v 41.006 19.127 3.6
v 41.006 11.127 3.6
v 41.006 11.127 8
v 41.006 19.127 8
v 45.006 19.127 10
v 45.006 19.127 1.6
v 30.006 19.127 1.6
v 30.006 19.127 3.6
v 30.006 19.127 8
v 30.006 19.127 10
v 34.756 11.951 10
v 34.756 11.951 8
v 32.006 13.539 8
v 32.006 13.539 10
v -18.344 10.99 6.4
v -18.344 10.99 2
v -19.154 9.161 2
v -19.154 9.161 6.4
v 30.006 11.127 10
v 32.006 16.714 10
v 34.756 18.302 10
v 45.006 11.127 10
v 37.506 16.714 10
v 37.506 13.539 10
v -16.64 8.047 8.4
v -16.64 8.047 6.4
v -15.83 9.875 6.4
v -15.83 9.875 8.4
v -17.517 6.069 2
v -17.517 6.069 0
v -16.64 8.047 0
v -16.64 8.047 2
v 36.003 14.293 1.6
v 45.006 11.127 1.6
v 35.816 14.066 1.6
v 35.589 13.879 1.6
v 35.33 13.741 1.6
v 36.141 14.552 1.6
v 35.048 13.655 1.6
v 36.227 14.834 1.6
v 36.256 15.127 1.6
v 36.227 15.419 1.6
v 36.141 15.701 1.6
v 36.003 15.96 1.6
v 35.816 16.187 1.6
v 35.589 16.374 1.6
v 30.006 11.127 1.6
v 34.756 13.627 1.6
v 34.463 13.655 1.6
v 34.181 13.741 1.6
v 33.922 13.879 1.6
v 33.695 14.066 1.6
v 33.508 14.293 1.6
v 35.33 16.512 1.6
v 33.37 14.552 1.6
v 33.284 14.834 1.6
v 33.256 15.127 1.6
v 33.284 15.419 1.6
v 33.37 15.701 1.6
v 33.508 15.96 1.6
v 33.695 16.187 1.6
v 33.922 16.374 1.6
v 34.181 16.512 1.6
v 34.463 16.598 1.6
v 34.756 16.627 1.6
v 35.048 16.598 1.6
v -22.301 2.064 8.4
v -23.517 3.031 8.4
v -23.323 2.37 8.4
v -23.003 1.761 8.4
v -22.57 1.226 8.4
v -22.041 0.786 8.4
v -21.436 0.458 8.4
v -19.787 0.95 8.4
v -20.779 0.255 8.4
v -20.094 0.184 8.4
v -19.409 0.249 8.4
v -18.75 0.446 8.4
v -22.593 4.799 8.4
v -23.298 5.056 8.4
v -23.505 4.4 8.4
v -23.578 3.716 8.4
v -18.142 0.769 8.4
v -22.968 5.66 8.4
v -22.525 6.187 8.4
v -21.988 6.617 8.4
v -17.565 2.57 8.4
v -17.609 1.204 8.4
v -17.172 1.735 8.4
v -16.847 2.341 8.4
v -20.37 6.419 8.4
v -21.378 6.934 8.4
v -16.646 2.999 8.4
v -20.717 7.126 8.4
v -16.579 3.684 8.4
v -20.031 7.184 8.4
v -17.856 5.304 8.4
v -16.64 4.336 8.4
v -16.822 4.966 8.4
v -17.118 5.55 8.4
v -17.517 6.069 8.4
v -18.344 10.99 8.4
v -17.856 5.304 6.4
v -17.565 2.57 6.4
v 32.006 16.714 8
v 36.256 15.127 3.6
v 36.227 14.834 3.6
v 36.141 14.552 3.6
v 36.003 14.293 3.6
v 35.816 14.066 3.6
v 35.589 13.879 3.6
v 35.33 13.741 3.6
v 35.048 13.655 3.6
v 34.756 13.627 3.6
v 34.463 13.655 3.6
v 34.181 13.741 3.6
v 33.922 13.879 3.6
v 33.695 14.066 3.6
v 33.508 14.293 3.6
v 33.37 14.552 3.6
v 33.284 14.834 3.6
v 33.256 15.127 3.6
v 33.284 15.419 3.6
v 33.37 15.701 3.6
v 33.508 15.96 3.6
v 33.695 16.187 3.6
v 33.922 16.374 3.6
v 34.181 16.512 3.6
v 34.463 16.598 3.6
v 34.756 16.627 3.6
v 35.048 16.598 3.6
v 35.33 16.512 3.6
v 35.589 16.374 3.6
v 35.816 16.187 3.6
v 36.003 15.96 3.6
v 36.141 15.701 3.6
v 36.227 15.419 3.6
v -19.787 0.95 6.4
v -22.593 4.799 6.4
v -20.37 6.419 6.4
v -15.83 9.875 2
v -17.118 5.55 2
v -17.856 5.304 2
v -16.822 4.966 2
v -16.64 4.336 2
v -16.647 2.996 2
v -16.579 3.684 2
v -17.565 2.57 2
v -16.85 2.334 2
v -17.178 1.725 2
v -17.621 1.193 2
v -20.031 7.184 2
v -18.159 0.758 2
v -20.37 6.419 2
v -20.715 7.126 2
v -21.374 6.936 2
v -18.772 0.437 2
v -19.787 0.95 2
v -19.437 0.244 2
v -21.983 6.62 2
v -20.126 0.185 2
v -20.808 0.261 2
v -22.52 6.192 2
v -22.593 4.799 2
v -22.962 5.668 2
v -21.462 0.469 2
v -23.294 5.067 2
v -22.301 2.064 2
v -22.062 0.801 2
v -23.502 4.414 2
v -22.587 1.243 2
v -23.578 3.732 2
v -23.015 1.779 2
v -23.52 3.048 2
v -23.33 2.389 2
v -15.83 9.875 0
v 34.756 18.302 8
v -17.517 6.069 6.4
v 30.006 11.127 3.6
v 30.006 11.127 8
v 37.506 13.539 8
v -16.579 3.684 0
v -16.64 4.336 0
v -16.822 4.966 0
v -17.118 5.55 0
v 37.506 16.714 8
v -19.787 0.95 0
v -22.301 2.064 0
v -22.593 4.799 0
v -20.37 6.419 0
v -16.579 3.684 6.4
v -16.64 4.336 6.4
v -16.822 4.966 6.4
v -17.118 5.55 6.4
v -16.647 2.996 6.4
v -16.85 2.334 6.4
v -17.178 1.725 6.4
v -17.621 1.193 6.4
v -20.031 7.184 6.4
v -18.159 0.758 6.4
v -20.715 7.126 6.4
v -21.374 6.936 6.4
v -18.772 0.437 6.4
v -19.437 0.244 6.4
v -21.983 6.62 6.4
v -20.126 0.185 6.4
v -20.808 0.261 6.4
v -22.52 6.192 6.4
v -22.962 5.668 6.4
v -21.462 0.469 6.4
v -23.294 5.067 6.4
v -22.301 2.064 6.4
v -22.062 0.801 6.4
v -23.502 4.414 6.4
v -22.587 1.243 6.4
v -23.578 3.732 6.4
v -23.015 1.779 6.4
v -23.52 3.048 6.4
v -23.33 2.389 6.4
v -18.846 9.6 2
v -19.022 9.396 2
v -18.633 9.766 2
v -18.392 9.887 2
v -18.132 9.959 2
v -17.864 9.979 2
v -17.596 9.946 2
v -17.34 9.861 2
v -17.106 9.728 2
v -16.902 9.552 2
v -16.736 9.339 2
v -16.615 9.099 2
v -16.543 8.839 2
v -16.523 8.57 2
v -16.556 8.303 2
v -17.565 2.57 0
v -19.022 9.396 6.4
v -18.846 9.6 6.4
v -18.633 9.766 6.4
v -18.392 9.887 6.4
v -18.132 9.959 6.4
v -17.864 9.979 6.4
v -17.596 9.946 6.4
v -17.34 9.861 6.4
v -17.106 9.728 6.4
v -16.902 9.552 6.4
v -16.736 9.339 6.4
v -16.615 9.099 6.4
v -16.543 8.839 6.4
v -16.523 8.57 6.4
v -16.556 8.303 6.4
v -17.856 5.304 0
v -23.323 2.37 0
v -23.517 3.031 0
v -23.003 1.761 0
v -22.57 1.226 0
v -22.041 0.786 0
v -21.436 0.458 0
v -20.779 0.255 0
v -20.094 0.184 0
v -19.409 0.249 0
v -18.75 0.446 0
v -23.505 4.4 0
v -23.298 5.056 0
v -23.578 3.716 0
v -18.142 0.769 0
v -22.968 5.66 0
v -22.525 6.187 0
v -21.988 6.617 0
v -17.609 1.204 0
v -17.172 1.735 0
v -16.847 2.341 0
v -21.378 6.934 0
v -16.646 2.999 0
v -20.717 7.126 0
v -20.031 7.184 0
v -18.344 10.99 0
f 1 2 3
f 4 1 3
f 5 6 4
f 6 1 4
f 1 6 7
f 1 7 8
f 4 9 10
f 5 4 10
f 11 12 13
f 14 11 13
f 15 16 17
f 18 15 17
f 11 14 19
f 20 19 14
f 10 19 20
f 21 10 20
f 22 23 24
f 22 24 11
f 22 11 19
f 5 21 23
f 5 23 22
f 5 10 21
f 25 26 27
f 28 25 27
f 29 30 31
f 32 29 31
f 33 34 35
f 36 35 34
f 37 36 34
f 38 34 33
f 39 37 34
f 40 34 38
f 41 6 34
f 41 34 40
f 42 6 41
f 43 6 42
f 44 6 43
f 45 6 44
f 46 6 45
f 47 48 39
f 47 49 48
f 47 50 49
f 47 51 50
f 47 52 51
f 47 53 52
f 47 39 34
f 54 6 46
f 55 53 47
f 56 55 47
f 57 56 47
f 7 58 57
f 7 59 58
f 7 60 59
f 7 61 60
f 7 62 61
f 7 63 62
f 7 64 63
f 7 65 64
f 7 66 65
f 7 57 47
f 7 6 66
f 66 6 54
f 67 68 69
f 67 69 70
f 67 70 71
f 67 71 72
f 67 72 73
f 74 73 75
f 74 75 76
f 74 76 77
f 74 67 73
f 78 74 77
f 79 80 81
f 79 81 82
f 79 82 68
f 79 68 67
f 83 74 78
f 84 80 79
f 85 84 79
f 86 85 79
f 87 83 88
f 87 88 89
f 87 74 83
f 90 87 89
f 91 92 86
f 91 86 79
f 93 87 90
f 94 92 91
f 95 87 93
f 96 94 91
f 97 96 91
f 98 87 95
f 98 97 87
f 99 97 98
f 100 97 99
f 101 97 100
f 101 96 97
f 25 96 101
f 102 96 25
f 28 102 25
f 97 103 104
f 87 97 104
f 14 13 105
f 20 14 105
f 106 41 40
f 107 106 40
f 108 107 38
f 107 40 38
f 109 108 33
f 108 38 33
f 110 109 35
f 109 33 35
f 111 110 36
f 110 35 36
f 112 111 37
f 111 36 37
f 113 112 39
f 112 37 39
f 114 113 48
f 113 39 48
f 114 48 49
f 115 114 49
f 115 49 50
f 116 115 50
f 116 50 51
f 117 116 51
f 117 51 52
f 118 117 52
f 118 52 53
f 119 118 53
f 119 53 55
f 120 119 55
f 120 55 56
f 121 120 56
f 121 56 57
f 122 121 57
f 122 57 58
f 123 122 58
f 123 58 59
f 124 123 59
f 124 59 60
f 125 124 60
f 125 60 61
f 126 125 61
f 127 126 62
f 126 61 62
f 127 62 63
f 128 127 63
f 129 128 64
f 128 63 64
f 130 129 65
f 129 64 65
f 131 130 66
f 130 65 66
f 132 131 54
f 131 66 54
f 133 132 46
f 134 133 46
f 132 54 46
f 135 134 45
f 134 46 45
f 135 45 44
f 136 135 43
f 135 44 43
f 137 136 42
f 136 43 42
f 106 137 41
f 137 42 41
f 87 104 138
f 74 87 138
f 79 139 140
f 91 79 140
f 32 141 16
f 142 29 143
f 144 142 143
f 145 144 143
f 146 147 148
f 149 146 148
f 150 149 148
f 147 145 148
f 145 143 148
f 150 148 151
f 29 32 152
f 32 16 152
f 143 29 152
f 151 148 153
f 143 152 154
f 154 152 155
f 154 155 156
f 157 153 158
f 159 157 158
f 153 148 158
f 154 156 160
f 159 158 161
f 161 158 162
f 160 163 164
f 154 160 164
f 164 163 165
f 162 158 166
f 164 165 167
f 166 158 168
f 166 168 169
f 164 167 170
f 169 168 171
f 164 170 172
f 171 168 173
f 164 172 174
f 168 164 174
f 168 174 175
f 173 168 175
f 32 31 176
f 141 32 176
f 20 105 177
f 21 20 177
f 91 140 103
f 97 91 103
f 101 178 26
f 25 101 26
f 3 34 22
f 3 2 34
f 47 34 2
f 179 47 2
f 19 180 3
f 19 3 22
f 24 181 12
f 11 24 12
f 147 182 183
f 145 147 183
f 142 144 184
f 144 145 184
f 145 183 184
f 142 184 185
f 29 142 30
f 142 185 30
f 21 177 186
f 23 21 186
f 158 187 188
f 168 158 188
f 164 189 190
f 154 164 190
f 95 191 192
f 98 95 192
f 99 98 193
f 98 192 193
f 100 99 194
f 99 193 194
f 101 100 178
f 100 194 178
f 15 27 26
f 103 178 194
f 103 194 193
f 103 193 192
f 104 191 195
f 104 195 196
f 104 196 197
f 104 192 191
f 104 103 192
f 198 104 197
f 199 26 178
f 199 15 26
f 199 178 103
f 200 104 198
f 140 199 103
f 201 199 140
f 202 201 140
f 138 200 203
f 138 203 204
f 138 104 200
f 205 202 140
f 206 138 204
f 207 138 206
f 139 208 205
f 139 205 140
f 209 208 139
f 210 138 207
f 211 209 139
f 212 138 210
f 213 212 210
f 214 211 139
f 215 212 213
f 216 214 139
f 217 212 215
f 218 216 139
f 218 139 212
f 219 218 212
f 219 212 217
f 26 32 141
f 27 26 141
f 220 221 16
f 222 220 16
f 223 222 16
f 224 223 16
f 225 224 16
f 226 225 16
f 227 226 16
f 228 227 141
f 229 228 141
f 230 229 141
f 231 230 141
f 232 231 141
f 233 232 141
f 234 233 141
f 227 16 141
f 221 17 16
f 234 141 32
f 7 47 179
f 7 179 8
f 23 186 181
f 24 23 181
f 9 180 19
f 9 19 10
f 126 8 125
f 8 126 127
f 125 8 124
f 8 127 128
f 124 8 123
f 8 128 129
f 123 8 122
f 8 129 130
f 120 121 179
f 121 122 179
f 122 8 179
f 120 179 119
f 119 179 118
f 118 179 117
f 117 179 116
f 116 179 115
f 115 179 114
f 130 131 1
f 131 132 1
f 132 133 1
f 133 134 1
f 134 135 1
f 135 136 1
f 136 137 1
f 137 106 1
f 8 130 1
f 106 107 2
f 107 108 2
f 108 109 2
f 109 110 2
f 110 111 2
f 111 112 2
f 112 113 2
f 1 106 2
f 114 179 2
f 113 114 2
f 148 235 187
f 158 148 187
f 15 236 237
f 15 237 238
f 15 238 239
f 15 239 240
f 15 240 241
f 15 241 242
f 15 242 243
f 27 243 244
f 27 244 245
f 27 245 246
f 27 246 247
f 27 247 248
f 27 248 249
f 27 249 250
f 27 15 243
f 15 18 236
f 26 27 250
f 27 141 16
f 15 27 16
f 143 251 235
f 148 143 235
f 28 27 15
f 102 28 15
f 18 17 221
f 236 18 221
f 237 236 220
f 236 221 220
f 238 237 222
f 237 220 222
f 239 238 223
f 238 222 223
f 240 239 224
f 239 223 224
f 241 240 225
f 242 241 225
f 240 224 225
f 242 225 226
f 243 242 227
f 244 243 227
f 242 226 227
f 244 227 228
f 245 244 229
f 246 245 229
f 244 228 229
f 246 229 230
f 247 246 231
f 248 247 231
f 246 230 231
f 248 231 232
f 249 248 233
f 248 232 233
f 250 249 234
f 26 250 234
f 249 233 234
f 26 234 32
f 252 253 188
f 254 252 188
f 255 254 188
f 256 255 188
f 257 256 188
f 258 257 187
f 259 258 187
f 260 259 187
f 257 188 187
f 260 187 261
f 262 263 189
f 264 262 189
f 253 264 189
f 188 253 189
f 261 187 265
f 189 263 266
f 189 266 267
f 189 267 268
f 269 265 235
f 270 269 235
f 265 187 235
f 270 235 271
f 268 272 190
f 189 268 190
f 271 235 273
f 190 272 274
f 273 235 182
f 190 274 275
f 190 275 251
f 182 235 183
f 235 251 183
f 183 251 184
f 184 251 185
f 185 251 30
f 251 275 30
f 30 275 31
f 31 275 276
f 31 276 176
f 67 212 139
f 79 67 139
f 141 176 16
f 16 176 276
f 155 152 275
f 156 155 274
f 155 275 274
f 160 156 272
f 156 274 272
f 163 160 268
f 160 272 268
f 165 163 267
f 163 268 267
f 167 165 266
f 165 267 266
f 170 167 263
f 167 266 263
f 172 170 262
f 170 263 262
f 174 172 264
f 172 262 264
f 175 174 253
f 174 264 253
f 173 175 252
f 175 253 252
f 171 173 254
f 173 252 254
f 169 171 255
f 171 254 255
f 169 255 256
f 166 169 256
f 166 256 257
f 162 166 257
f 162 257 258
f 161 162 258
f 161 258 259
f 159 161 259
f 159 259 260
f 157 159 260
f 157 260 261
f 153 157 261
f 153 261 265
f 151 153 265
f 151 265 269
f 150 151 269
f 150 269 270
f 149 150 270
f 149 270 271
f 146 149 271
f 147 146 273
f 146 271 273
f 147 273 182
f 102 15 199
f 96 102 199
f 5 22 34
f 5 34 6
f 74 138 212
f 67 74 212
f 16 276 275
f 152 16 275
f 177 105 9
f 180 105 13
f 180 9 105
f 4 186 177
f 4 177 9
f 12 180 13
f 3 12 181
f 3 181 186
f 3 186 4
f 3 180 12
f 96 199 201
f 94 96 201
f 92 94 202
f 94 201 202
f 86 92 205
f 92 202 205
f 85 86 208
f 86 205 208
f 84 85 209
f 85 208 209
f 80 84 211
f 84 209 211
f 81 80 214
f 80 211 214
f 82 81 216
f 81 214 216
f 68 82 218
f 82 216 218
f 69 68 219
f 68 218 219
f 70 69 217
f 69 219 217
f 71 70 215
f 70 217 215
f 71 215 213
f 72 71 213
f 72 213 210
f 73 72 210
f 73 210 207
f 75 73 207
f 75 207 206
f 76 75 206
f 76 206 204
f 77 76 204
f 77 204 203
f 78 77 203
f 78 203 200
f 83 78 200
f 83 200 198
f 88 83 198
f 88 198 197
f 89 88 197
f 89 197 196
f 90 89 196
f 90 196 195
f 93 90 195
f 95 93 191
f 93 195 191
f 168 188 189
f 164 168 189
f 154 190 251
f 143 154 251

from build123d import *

# Parameters (mm, degrees)
F1_DEPTH  = 8.4
F3_DEPTH  = 25
F4_W      = 9.4060590708
F4_H      = 4.4
F5_DEPTH  = 25
F7_DEPTH  = 4.4
F8_W      = 15
F8_H      = 8
F9_DEPTH  = 10
F10_W     = 11
F10_H     = 4.4
F11_DEPTH = 25
F12_W     = 15
F12_H     = 1.6
F13_DEPTH = 25
F14_DEPTH = 10
F15_R     = 1.5
F16_DEPTH = 25


# Not quite as in the source:
# - a feature names something its author has since deleted; it is built from what else it names


with BuildPart() as f1:
    # F0 (on Top) → F1 (new body)
    with BuildSketch(Plane.XY):
        with BuildLine():
            Line((-17.517138558, 6.0693021001), (-17.8563866138, 5.3041045041))
            Line((-17.8563866138, 5.3041045041), (-17.5646357736, 2.5696243986))
            Line((-17.5646357736, 2.5696243986), (-19.786889591, 0.9497207067))
            Line((-19.786889591, 0.9497207067), (-22.3008942486, 2.0642971202))
            Line((-22.3008942486, 2.0642971202), (-22.5926450887, 4.7987772257))
            Line((-22.5926450887, 4.7987772257), (-20.3703912714, 6.4186809176))
            Line((-20.3703912714, 6.4186809176), (-20.0311432156, 7.1838785137))
            ThreePointArc((-20.0311432156, 7.1838785137), (-22.570250378, 1.2261772417), (-16.5786404312, 3.6842008121))
            ThreePointArc((-16.5786404312, 3.6842008121), (-16.8217050192, 4.9657513269), (-17.517138558, 6.0693021001))
        make_face()
        with BuildLine():
            Line((-20.3703912714, 6.4186809176), (-17.8563866138, 5.3041045041))
            Line((-17.8563866138, 5.3041045041), (-17.517138558, 6.0693021001))
            ThreePointArc((-17.517138558, 6.0693021001), (-18.6600886321, 6.8838431036), (-20.0311432156, 7.1838785137))
            Line((-20.0311432156, 7.1838785137), (-20.3703912714, 6.4186809176))
        make_face()
        with BuildLine():
            ThreePointArc((-20.0311432156, 7.1838785137), (-18.6600886321, 6.8838431036), (-17.517138558, 6.0693021001))
            Line((-17.517138558, 6.0693021001), (-16.6404850717, 8.0466550396))
            ThreePointArc((-16.6404850717, 8.0466550396), (-17.3401991937, 9.8609455752), (-19.1544897293, 9.1612314532))
            Line((-19.1544897293, 9.1612314532), (-20.0311432156, 7.1838785137))
        make_face()
        with BuildLine():
            ThreePointArc((-19.1544897293, 9.1612314532), (-17.3401991937, 9.8609455752), (-16.6404850717, 8.0466550396))
            Line((-16.6404850717, 8.0466550396), (-15.8298840437, 9.8750220633))
            Line((-15.8298840437, 9.8750220633), (-18.3438887013, 10.9895984768))
            Line((-18.3438887013, 10.9895984768), (-19.1544897293, 9.1612314532))
        make_face()
    extrude(amount=F1_DEPTH)

    # F2 (on face) → F3 (cut)
    with BuildSketch(Plane(origin=(-16.8884163977, 7.4874286817, 0), x_dir=(0.405300514, 0.9141835118, 0), z_dir=(0.9141835118, -0.405300514, 0))):
        Polygon((-1.5512493534, 2), (2.6117222096, 2), (2.6117222096, 6.4), (-1.5512493534, 6.4), (-9.2430952936, 6.4), (-9.2430952936, 2), align=None)
    extrude(amount=-F3_DEPTH, mode=Mode.SUBTRACT)

    # F4 (on face) → F5 (cut)
    with BuildSketch(Plane(origin=(-16.8884163977, 7.4874286817, 0), x_dir=(-0.405300514, -0.9141835118, 0), z_dir=(-0.9141835118, 0.405300514, 0))):
        with Locations((3.2854164128, 4.2)):
            Rectangle(F4_W, F4_H)
    extrude(amount=-F5_DEPTH, mode=Mode.SUBTRACT)


with BuildPart() as f7:
    # F6 (on face) → F7 (new body)
    with BuildSketch(Plane.XY.offset(2)):
        with BuildLine():
            Line((-18.3438887013, 10.9895984768), (-19.1544897293, 9.1612314532))
            ThreePointArc((-19.1544897293, 9.1612314532), (-17.3401991937, 9.8609455752), (-16.6404850717, 8.0466550396))
            Line((-16.6404850717, 8.0466550396), (-15.8298840437, 9.8750220633))
            Line((-15.8298840437, 9.8750220633), (-18.3438887013, 10.9895984768))
        make_face()
    extrude(amount=F7_DEPTH)


with BuildPart() as f9:
    # F8 (on Top) → F9 (new body)
    with BuildSketch(Plane.XY):
        with Locations((37.5055125356, 15.1265042797)):
            Rectangle(F8_W, F8_H)
        Polygon((32.0055125356, 13.5387910394), (32.0055125356, 16.7142175199), (34.7555125356, 18.3019307602), (37.5055125356, 16.7142175199), (37.5055125356, 13.5387910394), (34.7555125356, 11.9510777991), align=None, mode=Mode.SUBTRACT)
    extrude(amount=F9_DEPTH)

    # F10 (on face) → F11 (cut)
    with BuildSketch(Plane.XZ.offset(-11.1265042797)):
        with Locations((35.5055125356, 5.8)):
            Rectangle(F10_W, F10_H)
    extrude(amount=-F11_DEPTH, mode=Mode.SUBTRACT)

    # F12 (on face) → F13 (cut)
    with BuildSketch(Plane(origin=(0, 19.1265042797, 0), x_dir=(-1, 0, 0), z_dir=(0, 1, 0))):
        with Locations((-37.5055125356, 0.8)):
            Rectangle(F12_W, F12_H)
    extrude(amount=-F13_DEPTH, mode=Mode.SUBTRACT)

    # F14 (add): a face of the model
    f14_faces = [f9.faces().sort_by_distance(p)[0] for p in [
        (30.0055125356, 15.1265042797, 2.6),
    ]]
    extrude(f14_faces, amount=-F14_DEPTH)

    # F15 (on face) → F16 (cut)
    with BuildSketch(Plane(origin=(0, 0, 1.6), x_dir=(1, 0, 0), z_dir=(0, 0, -1))):
        with Locations((34.7555125356, -15.1265042797)):
            Circle(F15_R)
    extrude(amount=-F16_DEPTH, mode=Mode.SUBTRACT)


solid = Compound([f1.part, f7.part, f9.part])
